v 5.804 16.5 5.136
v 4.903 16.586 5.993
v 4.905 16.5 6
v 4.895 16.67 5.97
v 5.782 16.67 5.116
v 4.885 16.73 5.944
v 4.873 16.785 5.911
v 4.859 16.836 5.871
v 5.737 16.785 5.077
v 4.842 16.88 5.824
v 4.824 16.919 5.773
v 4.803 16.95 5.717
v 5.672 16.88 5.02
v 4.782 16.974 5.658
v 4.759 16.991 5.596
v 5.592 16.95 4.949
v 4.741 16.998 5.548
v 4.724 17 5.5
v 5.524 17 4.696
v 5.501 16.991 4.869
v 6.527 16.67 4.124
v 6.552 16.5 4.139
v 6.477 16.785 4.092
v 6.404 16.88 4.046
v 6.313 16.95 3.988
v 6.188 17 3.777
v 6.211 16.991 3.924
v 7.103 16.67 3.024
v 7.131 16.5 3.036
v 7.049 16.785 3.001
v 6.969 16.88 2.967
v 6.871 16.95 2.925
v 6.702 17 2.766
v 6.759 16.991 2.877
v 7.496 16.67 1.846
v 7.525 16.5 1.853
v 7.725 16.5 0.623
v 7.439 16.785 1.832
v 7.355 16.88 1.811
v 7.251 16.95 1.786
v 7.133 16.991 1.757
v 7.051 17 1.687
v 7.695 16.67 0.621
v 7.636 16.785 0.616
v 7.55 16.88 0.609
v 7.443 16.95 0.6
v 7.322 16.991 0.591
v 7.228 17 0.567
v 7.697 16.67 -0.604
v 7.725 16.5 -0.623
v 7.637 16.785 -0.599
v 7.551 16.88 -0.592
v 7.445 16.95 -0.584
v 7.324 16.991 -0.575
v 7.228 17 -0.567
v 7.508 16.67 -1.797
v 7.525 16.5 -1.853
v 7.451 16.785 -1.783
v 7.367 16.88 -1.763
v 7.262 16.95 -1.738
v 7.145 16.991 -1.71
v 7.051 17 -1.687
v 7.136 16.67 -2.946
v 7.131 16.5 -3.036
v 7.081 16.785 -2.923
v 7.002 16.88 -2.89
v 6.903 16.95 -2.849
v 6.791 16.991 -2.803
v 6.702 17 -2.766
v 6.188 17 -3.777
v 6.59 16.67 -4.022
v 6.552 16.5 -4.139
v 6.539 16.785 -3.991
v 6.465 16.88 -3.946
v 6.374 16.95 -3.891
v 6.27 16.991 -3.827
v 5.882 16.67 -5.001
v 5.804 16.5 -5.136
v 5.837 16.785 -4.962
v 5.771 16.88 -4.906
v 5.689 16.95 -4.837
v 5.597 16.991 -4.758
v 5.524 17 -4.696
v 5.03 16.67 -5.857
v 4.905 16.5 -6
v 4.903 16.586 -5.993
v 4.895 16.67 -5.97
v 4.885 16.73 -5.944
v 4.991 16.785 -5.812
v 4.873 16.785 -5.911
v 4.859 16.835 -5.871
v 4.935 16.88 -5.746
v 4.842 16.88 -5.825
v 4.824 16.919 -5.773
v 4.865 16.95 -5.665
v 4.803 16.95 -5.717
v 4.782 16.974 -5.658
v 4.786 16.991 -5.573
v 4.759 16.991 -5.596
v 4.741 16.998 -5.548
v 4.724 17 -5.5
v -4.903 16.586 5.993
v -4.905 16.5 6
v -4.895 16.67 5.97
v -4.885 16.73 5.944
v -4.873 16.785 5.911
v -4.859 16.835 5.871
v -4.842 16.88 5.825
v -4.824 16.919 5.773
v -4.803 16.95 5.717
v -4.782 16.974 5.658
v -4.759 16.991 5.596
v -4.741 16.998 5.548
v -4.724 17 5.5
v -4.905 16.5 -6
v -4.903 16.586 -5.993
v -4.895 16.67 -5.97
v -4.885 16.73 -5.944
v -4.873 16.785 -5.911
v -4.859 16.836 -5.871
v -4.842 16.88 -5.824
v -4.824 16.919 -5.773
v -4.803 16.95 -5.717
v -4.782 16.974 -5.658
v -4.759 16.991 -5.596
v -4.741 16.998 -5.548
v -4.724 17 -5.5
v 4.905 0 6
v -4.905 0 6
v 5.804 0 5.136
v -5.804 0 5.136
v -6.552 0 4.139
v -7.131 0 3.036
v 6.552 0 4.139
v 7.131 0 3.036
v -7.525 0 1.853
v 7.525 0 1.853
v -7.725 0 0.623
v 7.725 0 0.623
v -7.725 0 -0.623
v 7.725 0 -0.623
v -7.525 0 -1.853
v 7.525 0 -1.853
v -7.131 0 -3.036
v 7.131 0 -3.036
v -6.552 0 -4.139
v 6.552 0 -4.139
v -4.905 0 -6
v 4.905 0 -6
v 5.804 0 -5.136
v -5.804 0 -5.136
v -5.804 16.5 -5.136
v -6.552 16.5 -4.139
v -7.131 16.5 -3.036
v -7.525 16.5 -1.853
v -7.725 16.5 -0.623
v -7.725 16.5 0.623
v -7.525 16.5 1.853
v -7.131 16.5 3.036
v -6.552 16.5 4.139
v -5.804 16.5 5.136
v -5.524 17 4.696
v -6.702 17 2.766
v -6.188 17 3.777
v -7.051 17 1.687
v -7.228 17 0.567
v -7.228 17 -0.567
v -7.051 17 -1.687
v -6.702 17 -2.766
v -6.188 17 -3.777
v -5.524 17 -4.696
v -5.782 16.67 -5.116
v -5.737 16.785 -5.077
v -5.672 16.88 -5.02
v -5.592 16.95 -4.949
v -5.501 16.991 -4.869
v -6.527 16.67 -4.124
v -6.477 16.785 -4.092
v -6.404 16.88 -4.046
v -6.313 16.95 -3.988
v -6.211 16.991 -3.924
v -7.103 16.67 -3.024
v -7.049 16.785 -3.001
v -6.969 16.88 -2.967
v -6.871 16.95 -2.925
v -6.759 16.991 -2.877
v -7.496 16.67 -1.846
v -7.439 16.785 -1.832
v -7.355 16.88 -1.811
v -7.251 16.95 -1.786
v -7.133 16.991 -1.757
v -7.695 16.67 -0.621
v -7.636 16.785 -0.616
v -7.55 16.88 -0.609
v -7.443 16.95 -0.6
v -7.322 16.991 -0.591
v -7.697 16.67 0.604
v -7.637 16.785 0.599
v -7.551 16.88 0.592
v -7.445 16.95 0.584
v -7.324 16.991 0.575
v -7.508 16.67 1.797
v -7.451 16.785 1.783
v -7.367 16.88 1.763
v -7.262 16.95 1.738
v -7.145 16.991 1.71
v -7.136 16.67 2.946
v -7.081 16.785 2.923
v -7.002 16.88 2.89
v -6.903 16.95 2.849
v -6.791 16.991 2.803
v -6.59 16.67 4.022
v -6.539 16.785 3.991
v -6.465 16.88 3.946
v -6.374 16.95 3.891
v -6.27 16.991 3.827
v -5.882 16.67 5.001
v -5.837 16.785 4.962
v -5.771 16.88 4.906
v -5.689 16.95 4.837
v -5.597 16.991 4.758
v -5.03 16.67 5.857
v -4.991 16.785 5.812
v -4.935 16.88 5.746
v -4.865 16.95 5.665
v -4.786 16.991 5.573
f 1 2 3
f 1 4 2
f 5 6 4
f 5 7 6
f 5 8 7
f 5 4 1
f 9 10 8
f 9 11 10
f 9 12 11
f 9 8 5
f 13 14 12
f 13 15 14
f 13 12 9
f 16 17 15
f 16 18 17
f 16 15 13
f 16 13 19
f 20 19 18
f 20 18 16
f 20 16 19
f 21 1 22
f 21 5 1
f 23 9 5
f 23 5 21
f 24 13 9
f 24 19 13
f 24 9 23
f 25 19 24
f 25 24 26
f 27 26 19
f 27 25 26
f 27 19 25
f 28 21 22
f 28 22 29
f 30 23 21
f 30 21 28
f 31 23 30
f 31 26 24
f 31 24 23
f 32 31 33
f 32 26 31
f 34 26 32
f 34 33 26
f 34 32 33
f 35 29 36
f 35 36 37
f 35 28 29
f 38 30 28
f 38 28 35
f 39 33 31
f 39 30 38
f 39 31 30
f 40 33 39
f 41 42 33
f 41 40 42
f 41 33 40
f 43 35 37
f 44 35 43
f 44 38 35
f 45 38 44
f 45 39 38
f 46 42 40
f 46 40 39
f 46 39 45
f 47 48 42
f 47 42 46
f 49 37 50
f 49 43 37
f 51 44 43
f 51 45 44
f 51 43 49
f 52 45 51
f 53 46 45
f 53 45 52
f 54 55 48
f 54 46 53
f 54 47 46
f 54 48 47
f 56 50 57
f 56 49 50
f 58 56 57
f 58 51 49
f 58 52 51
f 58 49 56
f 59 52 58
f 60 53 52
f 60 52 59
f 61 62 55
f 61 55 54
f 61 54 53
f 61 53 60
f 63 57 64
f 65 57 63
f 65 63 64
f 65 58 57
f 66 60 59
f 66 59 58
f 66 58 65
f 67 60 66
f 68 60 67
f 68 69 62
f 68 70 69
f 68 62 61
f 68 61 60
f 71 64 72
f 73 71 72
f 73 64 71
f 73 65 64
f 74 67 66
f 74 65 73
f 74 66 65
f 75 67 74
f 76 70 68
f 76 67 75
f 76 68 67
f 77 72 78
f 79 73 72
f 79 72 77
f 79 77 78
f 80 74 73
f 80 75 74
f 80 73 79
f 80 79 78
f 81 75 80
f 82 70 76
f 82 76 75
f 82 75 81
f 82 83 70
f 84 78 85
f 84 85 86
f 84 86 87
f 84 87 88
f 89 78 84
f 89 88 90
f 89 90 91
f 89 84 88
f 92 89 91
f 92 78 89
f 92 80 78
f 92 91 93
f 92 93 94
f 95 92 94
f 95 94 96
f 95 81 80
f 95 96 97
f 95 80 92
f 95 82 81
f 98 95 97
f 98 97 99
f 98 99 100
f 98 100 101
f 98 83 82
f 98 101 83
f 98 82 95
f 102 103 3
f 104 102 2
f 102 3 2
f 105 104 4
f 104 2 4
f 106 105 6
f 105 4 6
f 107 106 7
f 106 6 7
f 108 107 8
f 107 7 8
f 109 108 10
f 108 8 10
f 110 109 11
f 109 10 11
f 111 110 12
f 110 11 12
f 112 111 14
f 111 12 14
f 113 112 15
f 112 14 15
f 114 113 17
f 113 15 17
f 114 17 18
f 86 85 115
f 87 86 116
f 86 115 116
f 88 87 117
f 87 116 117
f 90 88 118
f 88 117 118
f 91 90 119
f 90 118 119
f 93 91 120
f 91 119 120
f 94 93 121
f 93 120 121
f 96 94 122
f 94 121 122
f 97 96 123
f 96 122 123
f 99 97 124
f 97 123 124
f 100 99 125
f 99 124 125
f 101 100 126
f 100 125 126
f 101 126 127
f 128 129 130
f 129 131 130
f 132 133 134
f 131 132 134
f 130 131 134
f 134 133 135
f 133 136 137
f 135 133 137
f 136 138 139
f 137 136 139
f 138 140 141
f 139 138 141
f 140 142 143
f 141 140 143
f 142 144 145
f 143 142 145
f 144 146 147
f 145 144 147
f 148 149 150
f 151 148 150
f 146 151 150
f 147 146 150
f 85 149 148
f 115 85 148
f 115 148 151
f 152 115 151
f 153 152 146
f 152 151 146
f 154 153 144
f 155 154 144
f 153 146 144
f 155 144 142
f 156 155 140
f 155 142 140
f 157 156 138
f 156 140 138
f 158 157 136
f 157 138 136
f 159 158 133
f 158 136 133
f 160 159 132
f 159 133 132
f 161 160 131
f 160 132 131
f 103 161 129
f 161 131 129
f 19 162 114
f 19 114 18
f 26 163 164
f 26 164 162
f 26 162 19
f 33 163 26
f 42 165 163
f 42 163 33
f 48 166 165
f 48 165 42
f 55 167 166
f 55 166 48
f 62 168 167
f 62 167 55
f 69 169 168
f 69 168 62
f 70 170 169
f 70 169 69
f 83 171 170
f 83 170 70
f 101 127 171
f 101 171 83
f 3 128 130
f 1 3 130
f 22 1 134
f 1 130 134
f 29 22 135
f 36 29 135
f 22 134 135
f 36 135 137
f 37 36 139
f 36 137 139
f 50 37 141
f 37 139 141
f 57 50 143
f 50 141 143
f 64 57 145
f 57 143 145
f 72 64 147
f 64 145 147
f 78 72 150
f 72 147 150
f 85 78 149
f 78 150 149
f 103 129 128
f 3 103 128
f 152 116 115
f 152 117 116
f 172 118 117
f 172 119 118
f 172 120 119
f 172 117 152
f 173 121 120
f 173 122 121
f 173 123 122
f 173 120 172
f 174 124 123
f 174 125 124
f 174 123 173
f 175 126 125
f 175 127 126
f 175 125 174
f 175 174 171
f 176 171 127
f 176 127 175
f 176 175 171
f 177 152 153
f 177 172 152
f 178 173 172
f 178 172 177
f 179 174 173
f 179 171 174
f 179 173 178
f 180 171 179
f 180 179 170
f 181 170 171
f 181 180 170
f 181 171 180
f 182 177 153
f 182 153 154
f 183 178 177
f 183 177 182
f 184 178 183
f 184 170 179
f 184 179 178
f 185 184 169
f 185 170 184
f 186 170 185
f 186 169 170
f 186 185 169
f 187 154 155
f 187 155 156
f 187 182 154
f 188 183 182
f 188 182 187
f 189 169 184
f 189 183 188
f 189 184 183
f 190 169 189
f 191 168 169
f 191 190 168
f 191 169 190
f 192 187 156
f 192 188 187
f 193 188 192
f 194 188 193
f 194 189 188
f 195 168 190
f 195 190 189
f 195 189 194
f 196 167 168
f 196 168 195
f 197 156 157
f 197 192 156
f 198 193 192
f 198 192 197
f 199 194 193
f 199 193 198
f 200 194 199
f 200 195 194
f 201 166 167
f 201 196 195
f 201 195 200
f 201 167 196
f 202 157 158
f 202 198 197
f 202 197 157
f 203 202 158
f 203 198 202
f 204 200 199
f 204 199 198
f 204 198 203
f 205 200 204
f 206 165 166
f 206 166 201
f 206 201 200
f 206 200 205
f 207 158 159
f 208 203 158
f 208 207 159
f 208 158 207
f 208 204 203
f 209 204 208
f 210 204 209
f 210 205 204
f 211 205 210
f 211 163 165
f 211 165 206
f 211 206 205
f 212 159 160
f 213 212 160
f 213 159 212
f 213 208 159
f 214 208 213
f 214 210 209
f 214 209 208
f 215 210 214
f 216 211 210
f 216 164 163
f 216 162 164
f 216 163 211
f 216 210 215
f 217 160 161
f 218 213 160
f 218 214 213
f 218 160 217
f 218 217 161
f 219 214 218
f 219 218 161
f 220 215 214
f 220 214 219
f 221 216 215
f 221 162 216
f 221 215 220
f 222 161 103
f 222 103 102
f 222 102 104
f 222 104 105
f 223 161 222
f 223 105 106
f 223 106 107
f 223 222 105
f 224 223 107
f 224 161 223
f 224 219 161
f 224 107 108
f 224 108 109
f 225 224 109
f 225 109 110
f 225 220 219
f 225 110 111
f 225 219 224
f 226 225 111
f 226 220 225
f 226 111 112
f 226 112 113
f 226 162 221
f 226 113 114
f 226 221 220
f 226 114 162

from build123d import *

# Parameters (mm, degrees)
SALIENTE_EXTRUIR1_DEPTH = 17
REDONDEO1_R             = 0.5


with BuildPart() as part:
    # Croquis1 → Saliente-Extruir1 (new body)
    with BuildSketch(Plane(origin=(0, 0, 0), x_dir=(1, 0, 0), z_dir=(0, 1, 0))):
        with BuildLine():
            Line((-4.905354218, -6), (4.905354218, -6))
            ThreePointArc((4.905354218, -6), (7.75, 0), (4.905354218, 6))
            Line((4.905354218, 6), (-4.905354218, 6))
            ThreePointArc((-4.905354218, 6), (-7.75, 0), (-4.905354218, -6))
        make_face()
    extrude(amount=SALIENTE_EXTRUIR1_DEPTH)

    # Redondeo1
    redondeo1_edges = [part.edges().sort_by_distance(p)[0] for p in [
        (-7.75, 17, 0),
        (0, 17, 6),
        (7.75, 17, 0),
        (0, 17, -6),
    ]]
    fillet(redondeo1_edges, radius=REDONDEO1_R)


solid = part.part
